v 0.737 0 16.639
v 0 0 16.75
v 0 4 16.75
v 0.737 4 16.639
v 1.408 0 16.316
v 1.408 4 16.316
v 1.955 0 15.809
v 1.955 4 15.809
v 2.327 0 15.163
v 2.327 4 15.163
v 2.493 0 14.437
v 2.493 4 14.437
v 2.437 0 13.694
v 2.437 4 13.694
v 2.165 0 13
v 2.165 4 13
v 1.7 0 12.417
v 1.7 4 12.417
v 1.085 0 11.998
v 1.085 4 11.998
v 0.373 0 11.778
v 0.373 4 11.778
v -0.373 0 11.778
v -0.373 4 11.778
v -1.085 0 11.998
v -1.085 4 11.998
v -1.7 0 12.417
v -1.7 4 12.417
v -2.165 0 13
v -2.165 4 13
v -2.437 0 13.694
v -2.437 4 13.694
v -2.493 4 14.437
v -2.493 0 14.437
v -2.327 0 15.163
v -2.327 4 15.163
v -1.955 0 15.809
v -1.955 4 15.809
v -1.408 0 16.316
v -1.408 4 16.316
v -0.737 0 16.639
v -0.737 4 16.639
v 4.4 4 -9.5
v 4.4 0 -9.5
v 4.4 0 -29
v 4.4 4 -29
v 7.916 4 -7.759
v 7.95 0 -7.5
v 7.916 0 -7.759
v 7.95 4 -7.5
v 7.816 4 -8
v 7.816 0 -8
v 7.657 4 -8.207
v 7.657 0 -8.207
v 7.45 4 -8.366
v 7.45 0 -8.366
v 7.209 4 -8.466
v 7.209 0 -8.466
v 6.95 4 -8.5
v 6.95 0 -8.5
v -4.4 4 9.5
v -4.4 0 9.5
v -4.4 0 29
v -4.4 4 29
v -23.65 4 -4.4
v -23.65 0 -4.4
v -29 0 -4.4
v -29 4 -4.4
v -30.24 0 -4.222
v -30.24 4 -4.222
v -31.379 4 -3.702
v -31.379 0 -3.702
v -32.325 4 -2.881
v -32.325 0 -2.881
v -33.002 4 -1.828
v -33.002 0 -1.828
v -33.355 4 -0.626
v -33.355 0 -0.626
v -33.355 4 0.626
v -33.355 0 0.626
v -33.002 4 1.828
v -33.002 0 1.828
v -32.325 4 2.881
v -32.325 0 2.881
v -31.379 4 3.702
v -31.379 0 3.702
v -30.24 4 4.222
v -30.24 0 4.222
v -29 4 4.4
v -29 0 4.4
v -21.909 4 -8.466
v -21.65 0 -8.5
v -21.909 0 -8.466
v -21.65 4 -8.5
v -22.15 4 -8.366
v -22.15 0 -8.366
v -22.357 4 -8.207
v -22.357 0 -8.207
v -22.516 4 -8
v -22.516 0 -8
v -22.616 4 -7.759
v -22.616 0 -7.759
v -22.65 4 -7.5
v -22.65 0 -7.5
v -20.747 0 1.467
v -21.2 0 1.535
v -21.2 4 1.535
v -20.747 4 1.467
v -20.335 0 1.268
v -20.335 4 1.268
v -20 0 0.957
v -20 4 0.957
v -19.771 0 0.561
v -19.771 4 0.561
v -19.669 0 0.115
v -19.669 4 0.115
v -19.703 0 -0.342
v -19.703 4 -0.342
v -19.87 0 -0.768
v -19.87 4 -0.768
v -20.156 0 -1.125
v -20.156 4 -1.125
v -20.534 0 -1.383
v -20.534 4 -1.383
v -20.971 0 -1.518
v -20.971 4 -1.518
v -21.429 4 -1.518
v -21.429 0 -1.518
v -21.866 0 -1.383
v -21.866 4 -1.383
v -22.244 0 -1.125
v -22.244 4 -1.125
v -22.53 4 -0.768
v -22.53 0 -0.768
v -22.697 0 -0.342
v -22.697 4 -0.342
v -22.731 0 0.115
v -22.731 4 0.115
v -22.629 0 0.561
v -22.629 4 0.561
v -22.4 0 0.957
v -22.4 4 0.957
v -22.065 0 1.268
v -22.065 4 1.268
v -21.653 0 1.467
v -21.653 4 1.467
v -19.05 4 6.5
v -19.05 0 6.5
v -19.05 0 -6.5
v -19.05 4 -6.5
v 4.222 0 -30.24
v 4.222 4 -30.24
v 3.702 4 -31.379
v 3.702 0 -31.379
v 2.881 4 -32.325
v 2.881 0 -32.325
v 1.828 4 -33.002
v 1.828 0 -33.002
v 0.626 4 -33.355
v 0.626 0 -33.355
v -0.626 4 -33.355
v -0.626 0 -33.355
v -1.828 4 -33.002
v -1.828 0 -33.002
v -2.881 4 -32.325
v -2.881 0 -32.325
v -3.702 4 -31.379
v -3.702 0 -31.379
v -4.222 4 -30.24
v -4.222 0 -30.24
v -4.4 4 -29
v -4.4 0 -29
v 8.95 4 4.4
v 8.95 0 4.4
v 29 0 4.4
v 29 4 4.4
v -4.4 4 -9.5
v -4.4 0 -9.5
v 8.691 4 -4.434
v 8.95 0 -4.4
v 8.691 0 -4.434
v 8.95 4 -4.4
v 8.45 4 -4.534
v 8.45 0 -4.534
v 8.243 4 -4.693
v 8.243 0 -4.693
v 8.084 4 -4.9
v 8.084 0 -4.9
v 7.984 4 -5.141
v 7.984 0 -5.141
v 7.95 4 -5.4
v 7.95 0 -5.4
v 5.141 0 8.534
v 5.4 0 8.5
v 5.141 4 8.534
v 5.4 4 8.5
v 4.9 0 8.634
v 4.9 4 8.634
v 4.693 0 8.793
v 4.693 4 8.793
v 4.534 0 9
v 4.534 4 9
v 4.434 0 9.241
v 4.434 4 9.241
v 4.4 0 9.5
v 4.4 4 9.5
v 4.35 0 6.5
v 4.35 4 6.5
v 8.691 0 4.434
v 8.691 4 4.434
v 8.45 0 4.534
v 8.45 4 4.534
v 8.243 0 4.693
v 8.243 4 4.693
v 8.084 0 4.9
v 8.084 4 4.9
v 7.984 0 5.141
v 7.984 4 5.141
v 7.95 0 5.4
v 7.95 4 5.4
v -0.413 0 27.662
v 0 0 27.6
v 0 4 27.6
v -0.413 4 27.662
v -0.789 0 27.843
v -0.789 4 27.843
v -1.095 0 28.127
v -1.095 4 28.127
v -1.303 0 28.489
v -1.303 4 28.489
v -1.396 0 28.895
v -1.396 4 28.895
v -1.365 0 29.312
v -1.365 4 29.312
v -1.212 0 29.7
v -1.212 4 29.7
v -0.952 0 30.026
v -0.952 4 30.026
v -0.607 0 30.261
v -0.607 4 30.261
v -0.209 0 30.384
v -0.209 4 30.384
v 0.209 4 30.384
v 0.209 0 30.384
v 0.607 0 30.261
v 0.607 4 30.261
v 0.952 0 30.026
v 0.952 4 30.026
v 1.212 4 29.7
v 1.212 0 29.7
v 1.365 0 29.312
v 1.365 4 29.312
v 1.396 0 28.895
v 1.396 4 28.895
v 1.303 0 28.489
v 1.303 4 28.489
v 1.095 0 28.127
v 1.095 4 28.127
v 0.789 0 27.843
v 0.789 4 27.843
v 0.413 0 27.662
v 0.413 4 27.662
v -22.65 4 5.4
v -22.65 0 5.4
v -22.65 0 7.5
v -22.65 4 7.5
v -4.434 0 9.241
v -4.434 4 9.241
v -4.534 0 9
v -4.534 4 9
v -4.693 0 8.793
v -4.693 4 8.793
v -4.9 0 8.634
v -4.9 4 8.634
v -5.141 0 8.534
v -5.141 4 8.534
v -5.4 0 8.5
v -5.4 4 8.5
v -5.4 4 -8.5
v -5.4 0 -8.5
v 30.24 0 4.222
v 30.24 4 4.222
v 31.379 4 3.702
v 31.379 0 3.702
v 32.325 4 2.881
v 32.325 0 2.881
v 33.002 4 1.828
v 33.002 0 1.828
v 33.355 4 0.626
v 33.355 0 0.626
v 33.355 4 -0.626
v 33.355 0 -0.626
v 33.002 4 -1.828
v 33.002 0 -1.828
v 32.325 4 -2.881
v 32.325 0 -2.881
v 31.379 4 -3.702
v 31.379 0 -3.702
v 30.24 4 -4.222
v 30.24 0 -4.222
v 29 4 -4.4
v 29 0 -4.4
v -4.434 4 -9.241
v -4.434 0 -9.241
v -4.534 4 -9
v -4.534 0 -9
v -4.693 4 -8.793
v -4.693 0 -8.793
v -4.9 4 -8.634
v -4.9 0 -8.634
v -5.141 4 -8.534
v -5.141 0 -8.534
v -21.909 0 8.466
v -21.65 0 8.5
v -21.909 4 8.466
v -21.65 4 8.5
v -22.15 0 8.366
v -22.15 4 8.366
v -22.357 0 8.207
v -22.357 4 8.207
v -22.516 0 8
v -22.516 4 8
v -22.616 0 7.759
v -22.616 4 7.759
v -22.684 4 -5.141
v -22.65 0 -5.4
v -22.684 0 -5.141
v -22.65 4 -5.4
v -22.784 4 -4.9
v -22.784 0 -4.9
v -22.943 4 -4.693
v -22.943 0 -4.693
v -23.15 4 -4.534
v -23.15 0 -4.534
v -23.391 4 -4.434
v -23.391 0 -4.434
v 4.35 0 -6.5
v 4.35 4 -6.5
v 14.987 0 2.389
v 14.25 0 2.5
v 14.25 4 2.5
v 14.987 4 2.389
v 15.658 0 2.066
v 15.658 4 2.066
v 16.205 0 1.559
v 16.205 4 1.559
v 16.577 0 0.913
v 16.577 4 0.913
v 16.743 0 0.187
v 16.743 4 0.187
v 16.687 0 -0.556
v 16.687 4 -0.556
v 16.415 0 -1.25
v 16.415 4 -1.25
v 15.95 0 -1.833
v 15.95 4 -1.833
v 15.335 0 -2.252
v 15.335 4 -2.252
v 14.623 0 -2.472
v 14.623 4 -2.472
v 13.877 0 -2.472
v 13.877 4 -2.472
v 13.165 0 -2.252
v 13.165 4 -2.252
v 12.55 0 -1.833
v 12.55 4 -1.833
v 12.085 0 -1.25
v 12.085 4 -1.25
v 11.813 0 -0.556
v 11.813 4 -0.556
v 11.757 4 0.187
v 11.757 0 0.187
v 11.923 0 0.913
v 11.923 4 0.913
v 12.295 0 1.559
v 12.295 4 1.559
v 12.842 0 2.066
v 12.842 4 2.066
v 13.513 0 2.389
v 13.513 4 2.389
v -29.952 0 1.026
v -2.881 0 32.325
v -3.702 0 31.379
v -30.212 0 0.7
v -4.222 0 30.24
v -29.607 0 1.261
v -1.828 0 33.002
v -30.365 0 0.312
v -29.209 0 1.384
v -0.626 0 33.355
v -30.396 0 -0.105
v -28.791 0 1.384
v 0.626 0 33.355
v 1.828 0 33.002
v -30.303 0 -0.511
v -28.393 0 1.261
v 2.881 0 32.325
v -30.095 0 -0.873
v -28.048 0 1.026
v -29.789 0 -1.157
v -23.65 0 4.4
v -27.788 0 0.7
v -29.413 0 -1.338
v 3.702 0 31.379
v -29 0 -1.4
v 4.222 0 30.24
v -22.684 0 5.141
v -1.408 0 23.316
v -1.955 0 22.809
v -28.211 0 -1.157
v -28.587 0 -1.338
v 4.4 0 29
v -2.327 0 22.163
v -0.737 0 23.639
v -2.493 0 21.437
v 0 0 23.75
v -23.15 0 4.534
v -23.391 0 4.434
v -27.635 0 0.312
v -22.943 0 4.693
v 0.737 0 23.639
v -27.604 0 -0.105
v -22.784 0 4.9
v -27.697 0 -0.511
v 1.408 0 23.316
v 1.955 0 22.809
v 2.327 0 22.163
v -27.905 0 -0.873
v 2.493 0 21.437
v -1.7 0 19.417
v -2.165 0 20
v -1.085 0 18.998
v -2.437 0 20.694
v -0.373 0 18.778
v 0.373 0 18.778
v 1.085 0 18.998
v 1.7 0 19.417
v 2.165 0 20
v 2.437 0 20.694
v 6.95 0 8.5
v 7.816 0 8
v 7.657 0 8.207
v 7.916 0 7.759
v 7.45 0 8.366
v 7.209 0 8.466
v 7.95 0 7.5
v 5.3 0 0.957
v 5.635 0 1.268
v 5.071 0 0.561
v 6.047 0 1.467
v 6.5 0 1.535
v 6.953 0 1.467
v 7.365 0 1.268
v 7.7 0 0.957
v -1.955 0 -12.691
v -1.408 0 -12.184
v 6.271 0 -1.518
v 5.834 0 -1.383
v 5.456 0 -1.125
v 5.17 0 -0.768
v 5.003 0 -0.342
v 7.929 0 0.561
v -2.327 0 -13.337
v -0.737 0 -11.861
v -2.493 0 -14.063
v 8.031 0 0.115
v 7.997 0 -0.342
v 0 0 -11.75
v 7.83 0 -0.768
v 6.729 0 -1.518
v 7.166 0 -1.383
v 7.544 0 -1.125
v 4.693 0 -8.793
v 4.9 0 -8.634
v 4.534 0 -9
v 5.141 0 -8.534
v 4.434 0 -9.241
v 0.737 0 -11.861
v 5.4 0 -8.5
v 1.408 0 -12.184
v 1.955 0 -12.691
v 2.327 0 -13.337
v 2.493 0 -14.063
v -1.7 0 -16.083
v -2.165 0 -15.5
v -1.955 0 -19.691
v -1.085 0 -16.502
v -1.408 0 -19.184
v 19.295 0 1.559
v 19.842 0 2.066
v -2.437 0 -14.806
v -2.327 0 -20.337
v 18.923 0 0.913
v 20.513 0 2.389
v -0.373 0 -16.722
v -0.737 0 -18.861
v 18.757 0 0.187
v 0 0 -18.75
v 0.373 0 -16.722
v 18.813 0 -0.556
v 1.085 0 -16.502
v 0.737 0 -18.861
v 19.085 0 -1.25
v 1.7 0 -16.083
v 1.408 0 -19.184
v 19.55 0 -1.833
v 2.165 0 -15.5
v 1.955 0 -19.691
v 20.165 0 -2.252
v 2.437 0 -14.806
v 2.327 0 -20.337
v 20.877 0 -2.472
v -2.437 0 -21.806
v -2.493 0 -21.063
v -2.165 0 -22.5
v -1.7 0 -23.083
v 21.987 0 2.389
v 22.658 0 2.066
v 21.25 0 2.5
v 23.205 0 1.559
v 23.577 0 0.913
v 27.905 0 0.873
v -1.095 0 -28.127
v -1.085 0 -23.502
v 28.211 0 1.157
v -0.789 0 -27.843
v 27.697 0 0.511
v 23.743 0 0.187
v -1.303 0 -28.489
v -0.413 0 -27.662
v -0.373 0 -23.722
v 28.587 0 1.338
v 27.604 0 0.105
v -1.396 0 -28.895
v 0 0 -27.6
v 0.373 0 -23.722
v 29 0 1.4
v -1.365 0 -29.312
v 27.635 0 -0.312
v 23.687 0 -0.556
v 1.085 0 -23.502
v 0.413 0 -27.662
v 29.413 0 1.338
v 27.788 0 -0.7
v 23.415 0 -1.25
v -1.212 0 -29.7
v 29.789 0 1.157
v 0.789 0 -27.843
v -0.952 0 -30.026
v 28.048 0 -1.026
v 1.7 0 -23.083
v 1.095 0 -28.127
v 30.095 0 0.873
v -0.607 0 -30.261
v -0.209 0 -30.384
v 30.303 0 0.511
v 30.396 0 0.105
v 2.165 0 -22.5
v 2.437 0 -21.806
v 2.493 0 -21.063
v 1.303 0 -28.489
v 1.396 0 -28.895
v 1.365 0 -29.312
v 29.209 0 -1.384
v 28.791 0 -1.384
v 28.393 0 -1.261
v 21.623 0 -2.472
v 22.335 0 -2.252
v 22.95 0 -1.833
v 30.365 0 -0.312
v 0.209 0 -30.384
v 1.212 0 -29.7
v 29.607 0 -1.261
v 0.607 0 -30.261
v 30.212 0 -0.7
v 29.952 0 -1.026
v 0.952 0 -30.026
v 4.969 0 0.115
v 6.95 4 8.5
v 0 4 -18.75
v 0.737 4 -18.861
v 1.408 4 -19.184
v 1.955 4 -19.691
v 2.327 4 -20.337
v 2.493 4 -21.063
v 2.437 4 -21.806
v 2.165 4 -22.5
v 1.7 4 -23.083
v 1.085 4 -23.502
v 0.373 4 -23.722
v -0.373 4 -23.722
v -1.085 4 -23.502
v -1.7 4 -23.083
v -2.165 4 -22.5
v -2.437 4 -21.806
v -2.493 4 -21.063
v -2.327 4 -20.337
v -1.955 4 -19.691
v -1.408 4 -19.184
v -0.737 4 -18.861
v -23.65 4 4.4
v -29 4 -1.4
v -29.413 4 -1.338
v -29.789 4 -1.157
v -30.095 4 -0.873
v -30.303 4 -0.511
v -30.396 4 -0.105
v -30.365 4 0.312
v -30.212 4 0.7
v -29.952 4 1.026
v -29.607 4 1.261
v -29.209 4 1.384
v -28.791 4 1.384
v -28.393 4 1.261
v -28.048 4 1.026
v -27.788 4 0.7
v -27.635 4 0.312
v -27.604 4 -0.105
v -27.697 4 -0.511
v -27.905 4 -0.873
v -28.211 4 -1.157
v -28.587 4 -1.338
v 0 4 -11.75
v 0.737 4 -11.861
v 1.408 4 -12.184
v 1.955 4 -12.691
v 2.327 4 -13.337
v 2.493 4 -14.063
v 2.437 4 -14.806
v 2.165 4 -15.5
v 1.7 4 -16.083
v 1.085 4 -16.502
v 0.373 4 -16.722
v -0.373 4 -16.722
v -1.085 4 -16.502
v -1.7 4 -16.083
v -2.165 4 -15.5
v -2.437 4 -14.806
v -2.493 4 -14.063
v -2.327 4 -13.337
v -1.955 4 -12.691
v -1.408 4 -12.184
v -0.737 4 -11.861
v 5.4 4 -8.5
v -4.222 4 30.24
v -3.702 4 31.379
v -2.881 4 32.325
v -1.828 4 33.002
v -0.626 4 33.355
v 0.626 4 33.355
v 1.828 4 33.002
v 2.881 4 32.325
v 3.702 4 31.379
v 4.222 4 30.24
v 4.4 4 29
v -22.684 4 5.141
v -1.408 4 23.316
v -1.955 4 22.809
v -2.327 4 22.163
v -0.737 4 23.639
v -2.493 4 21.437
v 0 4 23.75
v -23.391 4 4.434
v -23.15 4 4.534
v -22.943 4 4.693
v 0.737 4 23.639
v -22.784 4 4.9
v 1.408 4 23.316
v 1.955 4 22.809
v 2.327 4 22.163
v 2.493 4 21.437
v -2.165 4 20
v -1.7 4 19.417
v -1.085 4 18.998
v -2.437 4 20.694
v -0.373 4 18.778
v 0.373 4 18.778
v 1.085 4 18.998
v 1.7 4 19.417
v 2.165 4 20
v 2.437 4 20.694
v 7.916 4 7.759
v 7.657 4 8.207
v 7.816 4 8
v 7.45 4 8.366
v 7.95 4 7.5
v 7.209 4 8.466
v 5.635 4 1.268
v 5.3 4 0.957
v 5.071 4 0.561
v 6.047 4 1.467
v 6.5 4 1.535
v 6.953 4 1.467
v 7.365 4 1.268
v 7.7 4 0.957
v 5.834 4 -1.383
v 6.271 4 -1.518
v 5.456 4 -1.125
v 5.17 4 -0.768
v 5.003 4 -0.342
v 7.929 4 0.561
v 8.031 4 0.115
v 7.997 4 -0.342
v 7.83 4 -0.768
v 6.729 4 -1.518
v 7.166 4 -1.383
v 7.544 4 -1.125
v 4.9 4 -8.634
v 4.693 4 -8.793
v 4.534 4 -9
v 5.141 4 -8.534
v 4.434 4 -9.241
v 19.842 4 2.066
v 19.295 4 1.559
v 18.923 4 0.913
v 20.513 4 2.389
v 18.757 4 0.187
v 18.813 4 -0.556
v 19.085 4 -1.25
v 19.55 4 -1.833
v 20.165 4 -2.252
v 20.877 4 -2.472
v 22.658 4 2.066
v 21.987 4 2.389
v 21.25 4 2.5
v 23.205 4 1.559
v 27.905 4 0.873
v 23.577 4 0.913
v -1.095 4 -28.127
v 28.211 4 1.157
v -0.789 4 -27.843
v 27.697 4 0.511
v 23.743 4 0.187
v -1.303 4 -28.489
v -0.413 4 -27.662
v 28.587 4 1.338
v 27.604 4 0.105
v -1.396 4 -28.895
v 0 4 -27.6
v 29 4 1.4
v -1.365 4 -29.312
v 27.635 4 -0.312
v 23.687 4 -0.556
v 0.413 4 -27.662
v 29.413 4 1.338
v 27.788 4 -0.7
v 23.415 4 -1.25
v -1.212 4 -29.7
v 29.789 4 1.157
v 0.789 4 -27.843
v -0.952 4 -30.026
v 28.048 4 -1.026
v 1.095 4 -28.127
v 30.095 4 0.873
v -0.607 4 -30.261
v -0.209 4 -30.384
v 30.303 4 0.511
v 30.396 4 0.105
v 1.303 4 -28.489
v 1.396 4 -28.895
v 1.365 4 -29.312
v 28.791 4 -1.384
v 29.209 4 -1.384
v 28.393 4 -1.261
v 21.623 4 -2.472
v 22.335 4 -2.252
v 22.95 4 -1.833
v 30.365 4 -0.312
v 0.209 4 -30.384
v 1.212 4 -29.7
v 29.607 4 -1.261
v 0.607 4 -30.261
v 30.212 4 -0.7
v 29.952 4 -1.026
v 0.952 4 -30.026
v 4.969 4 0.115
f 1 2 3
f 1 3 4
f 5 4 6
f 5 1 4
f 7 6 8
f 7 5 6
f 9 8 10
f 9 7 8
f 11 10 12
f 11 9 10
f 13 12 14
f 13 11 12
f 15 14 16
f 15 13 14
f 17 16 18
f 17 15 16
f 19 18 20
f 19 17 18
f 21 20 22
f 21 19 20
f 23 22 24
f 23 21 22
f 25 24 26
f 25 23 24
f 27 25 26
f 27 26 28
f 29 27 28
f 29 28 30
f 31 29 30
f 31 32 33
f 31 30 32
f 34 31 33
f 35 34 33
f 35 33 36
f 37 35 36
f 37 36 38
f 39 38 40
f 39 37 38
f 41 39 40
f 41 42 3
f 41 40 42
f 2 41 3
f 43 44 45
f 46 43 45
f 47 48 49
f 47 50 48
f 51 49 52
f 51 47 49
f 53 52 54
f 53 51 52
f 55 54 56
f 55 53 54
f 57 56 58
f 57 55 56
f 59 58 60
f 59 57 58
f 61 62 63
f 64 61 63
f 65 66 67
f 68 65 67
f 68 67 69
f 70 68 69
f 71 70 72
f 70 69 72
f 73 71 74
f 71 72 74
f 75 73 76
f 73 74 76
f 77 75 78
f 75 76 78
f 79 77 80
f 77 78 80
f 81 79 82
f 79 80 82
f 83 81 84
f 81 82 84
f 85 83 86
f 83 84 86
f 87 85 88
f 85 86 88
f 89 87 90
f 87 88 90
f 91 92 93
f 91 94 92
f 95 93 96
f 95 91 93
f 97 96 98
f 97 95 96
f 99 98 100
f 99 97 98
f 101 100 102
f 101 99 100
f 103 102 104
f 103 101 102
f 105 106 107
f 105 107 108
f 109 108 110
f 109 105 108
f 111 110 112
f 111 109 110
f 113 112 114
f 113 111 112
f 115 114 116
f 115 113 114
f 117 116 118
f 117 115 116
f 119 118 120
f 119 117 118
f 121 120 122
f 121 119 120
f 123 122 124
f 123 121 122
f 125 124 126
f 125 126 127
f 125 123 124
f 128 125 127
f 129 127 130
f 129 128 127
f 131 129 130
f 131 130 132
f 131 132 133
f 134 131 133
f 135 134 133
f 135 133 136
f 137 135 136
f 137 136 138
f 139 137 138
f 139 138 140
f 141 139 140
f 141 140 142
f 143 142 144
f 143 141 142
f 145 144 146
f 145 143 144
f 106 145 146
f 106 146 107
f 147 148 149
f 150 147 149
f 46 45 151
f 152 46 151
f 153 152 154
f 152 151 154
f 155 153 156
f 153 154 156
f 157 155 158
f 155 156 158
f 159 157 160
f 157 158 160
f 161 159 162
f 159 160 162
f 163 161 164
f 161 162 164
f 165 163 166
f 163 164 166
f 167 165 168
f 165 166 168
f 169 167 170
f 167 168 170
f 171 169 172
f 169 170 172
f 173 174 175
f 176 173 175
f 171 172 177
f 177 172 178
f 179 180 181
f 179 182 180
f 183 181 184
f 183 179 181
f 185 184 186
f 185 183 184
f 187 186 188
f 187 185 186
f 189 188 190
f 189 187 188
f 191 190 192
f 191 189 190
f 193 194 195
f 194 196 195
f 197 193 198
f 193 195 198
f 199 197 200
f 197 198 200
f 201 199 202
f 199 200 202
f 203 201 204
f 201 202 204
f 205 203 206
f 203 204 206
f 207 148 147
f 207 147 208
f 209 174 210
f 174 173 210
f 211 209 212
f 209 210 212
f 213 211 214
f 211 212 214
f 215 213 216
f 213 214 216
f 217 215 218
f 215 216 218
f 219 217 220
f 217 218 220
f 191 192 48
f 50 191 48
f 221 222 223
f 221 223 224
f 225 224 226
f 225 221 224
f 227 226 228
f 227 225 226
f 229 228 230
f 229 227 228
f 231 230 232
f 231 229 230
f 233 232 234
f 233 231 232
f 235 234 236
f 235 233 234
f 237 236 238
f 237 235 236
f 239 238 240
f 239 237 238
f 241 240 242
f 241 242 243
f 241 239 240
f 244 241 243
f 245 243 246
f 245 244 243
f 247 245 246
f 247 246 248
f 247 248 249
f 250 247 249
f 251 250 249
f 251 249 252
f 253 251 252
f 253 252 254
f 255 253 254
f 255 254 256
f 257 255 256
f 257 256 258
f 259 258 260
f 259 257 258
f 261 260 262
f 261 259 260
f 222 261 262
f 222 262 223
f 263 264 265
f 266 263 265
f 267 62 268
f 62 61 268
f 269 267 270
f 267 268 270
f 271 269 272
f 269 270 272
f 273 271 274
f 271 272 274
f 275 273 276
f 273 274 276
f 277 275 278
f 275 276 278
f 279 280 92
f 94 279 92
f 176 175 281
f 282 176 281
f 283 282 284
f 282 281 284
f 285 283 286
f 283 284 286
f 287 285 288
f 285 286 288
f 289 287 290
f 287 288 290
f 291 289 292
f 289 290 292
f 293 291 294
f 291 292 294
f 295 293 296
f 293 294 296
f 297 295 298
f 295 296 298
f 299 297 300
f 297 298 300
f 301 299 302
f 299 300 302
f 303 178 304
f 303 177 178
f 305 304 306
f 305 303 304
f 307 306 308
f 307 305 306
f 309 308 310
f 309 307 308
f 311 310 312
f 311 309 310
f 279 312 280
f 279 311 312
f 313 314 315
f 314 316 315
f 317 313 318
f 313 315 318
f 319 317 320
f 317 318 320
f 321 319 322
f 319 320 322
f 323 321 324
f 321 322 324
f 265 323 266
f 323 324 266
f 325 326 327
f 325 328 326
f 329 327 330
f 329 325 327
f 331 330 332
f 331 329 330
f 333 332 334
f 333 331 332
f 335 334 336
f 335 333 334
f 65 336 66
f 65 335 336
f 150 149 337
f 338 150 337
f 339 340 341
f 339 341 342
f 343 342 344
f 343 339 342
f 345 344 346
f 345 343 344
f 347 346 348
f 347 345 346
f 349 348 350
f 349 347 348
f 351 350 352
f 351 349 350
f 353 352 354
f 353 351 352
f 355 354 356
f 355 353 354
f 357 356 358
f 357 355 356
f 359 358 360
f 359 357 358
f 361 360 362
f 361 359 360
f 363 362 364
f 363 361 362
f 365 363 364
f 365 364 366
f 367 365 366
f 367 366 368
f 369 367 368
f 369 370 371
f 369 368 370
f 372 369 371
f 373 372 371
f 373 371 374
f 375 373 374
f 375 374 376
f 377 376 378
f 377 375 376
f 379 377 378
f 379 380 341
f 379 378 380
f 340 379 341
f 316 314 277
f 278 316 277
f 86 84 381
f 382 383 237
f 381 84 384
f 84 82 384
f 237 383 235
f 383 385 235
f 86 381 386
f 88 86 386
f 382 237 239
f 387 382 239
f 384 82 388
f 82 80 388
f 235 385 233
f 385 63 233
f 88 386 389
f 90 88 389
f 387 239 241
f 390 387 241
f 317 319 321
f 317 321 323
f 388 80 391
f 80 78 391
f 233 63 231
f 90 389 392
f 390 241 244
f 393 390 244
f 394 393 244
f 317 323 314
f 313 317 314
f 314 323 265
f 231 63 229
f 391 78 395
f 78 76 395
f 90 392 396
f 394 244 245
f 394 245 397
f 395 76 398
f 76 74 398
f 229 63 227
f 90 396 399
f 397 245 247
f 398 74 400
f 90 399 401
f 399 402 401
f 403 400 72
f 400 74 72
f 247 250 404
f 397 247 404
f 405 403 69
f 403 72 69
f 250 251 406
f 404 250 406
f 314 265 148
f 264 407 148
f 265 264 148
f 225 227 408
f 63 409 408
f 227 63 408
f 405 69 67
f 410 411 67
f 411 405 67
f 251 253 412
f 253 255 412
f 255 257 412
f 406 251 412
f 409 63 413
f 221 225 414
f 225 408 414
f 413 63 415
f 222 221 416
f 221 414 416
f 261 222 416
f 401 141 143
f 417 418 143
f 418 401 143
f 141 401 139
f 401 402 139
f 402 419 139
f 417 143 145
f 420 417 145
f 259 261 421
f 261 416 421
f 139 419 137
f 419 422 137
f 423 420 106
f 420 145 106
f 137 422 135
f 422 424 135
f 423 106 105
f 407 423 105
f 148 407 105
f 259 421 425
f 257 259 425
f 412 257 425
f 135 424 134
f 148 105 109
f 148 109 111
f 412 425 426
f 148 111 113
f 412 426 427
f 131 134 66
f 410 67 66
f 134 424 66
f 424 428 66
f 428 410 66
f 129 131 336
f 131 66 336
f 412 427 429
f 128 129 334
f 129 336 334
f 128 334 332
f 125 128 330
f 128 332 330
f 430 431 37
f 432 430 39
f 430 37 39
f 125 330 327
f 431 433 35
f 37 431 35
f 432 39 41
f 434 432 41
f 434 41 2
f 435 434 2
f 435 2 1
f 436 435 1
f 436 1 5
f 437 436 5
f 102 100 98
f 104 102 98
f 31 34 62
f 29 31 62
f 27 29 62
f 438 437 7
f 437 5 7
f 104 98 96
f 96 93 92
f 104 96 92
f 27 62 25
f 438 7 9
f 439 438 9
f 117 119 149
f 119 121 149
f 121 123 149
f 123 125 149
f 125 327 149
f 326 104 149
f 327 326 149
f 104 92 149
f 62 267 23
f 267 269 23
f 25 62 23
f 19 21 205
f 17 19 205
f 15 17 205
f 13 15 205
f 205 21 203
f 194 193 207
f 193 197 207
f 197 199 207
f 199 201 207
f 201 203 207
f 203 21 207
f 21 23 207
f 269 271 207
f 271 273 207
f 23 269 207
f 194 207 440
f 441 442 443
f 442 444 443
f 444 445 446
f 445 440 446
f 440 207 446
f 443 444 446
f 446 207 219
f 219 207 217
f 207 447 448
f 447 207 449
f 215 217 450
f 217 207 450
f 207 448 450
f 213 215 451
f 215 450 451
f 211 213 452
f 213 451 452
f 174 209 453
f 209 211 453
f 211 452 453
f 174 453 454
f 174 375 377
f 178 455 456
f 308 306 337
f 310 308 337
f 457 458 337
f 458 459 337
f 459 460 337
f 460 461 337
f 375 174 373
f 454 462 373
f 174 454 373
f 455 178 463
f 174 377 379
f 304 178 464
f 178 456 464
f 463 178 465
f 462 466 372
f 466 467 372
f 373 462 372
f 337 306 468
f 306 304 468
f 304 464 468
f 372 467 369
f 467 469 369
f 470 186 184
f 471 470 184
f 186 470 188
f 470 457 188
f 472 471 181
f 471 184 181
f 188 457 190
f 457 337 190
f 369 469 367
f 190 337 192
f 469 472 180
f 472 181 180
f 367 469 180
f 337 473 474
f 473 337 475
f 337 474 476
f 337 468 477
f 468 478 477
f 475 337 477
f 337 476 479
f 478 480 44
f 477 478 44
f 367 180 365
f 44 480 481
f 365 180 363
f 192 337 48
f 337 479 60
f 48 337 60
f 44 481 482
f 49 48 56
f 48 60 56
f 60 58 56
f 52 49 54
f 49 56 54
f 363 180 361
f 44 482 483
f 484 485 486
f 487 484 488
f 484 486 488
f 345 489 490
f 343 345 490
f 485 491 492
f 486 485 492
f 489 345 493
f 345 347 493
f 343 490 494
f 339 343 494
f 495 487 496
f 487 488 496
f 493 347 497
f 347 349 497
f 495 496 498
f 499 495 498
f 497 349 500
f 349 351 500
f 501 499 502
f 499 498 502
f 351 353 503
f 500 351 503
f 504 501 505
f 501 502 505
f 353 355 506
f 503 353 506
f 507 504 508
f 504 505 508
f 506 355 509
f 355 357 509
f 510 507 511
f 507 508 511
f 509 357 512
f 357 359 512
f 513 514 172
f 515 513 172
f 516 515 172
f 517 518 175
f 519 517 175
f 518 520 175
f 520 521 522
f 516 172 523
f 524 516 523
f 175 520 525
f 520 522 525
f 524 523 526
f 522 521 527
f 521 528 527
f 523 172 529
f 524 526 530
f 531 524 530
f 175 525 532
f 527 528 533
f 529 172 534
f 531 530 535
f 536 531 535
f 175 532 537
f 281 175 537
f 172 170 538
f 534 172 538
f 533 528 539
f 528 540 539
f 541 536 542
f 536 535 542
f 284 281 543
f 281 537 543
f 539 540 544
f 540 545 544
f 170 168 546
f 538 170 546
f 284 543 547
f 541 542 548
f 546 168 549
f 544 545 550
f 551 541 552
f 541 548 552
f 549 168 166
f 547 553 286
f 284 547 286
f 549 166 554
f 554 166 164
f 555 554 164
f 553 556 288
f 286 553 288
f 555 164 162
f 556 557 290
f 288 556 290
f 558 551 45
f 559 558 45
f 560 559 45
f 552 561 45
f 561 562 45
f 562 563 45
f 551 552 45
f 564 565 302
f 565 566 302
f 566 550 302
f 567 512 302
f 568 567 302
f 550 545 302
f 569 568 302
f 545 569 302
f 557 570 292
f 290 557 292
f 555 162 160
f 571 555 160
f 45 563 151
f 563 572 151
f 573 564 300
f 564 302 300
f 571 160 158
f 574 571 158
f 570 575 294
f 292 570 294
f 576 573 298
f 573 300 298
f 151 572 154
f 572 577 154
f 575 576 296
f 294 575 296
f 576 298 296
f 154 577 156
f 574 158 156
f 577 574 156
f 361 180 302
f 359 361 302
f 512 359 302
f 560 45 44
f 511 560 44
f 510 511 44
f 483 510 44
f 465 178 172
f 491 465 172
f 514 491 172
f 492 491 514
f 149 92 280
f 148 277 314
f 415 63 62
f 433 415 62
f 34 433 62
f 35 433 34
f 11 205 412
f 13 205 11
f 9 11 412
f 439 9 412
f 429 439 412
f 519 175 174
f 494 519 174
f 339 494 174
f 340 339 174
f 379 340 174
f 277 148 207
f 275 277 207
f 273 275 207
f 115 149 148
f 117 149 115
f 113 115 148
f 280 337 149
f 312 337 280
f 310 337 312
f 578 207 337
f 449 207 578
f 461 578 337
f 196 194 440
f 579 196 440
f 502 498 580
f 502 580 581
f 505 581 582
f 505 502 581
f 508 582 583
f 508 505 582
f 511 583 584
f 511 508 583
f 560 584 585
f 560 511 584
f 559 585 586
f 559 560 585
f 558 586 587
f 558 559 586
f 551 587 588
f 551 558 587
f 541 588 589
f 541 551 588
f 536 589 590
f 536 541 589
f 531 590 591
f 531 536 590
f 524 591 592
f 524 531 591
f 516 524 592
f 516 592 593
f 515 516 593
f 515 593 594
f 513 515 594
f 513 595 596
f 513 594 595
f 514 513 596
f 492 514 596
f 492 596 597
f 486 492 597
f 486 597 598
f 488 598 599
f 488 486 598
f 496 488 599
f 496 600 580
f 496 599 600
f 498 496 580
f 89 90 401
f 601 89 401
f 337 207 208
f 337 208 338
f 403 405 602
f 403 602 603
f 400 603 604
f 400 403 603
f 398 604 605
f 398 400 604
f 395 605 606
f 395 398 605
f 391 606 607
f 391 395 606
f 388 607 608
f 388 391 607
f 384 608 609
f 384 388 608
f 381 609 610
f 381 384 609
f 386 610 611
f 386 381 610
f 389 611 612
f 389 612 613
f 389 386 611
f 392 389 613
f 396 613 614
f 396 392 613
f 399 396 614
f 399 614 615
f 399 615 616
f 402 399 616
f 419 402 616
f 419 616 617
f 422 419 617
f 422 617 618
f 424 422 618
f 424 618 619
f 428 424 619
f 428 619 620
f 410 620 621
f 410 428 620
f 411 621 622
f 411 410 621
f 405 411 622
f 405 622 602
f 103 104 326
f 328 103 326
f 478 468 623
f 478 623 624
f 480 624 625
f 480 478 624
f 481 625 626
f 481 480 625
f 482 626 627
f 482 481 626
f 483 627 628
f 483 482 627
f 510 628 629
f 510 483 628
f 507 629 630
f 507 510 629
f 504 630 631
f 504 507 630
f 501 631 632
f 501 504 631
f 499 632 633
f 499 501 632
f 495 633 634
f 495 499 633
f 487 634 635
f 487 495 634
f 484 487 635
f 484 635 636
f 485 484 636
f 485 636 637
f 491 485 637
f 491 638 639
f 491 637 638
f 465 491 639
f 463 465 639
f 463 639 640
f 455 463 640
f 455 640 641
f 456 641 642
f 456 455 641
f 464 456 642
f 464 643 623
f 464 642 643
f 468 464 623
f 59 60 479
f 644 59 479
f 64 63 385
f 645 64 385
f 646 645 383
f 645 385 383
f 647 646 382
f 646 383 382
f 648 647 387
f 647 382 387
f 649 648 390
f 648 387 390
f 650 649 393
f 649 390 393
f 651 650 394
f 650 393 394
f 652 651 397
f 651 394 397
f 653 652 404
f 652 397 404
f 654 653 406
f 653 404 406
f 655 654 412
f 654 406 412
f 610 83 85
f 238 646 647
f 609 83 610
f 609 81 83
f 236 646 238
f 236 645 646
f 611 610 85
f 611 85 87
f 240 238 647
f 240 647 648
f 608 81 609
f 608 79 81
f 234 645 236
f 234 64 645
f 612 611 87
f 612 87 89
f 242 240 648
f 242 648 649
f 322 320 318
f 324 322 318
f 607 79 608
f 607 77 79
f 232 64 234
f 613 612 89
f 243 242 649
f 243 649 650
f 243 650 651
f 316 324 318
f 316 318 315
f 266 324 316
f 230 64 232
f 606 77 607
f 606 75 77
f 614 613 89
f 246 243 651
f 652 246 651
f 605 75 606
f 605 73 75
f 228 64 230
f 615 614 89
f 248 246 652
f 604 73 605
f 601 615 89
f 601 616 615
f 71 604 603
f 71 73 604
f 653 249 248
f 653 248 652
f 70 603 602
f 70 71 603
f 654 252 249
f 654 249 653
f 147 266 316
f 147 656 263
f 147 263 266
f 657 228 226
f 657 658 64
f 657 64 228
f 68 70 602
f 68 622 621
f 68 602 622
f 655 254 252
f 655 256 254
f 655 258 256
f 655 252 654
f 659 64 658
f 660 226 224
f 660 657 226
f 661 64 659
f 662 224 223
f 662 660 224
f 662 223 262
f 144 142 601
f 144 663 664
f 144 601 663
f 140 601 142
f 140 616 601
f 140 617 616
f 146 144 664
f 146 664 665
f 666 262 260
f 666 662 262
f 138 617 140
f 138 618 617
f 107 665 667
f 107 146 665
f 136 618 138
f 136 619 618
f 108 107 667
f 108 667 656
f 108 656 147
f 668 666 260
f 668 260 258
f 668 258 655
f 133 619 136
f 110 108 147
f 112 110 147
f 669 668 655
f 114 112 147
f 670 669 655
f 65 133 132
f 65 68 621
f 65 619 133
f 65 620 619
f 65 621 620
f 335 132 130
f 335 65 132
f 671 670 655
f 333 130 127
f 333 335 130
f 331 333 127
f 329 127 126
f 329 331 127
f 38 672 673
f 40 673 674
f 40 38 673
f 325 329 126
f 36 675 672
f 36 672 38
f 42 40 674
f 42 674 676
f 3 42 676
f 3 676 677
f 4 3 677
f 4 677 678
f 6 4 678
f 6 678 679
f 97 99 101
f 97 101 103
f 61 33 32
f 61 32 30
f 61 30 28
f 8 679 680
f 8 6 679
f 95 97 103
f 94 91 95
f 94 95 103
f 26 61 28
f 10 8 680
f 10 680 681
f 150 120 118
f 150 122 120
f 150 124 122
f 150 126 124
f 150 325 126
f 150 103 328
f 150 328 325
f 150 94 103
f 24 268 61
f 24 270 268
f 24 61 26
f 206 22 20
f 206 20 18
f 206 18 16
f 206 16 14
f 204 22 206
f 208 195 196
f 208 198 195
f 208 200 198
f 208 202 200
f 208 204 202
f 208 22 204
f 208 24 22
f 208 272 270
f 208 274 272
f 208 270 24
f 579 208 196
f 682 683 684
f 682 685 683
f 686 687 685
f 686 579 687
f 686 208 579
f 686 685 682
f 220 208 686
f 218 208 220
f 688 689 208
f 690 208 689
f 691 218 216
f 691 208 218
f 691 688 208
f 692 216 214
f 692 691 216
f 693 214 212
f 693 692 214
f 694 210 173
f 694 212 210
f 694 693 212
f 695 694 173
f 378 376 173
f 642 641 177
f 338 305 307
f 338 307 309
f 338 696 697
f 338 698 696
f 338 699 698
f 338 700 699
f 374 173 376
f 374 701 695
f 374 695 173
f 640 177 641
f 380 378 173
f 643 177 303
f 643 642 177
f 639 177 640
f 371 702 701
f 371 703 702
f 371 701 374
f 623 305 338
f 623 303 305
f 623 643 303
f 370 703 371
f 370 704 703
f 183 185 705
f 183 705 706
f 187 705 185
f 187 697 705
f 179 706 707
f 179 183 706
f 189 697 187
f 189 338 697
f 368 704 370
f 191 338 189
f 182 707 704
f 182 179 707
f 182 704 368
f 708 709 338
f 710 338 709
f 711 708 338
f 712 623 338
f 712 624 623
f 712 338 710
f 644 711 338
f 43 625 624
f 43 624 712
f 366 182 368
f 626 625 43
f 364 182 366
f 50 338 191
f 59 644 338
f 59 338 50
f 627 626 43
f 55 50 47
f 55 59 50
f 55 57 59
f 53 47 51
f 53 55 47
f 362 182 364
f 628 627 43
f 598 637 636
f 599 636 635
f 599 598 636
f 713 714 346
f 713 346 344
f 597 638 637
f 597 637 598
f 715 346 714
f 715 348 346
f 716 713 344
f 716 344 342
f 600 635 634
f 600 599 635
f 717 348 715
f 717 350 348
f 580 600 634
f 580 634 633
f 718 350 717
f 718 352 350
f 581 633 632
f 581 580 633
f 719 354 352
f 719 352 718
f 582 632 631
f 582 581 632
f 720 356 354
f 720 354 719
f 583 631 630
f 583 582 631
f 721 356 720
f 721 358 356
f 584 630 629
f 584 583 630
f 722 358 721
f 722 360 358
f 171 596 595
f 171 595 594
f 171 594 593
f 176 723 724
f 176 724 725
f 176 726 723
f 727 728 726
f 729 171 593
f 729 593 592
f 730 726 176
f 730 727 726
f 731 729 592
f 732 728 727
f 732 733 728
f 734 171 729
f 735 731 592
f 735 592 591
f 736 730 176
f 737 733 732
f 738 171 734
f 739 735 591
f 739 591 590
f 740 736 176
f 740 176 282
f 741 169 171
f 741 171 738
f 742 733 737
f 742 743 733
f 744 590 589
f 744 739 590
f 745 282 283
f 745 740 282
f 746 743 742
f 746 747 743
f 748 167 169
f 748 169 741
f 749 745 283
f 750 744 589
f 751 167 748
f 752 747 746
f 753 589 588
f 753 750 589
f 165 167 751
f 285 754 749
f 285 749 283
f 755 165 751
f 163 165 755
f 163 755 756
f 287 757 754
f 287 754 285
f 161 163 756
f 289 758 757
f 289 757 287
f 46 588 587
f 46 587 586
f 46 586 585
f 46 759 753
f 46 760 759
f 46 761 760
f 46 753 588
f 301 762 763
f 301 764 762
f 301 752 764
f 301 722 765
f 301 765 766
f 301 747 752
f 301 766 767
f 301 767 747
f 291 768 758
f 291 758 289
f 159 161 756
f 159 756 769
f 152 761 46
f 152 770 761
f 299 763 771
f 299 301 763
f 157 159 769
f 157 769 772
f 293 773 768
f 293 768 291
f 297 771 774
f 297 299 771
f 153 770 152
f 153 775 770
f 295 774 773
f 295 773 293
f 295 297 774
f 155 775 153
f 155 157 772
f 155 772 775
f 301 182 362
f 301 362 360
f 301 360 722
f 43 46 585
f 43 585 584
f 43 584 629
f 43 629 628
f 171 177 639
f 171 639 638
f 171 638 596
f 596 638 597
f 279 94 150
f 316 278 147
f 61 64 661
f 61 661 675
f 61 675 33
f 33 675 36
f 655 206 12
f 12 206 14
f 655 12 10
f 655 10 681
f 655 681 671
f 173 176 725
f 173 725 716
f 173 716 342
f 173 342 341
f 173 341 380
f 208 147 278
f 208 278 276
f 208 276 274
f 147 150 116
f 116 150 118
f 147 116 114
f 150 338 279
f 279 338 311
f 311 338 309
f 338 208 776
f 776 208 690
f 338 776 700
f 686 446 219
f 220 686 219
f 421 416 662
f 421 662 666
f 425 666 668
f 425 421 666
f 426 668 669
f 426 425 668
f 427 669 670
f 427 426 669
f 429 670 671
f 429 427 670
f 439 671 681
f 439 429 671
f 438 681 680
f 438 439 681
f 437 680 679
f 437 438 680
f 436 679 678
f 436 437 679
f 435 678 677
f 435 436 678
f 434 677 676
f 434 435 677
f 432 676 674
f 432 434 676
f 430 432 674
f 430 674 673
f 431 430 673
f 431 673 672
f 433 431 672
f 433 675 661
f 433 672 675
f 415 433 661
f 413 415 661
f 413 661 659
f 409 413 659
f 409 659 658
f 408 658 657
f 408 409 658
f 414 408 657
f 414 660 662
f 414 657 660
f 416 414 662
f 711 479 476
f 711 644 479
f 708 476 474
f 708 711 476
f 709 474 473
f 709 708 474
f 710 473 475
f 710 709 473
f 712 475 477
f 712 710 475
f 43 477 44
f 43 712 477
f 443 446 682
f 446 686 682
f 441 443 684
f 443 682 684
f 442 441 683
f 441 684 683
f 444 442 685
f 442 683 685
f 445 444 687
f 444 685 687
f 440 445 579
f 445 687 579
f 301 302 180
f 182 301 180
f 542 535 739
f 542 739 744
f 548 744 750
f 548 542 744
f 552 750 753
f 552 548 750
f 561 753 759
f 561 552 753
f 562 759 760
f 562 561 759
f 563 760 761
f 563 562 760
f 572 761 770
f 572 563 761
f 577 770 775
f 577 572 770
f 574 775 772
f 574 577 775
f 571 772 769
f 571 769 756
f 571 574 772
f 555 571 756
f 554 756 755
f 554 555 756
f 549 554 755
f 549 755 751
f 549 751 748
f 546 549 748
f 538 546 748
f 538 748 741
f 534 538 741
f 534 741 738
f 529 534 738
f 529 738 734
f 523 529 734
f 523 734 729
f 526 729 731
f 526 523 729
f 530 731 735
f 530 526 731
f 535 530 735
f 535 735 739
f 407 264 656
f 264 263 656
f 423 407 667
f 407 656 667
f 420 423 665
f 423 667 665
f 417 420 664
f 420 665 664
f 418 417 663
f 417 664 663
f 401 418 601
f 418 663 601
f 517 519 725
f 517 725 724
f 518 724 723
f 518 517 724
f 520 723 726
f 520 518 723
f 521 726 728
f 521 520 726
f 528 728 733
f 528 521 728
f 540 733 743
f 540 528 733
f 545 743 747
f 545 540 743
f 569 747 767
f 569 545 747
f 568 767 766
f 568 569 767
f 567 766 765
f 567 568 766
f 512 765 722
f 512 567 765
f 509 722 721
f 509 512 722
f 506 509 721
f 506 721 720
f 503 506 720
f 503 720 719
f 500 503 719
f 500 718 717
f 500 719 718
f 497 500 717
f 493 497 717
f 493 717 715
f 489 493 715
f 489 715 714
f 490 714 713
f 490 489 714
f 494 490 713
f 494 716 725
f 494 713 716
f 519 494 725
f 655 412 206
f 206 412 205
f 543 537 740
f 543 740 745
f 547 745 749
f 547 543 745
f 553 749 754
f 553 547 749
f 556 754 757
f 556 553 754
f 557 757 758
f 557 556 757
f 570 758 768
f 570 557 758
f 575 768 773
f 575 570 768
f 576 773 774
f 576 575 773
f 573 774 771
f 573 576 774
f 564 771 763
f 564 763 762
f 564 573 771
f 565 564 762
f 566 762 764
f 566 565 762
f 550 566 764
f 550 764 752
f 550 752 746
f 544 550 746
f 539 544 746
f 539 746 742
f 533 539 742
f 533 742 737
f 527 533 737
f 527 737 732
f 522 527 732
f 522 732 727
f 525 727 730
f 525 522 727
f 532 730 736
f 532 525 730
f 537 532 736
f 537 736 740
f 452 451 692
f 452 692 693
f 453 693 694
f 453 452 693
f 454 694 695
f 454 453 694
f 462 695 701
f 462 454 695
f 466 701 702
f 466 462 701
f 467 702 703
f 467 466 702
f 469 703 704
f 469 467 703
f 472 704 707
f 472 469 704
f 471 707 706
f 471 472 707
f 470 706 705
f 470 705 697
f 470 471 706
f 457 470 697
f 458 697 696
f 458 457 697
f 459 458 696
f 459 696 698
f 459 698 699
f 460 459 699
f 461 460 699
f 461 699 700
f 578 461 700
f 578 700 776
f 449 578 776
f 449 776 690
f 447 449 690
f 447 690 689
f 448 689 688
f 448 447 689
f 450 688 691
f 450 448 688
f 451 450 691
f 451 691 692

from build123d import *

# Parameters (mm, degrees)
SKETCH2_R               = 1.4
SKETCH2_R_2             = 1.535241885
SKETCH2_W               = 23.4
SKETCH2_H               = 13
BOSS_EXTRUDE2_DEPTH     = 4
CUT_EXTRUDE3_DEPTH      = 48.403797316
CUT_EXTRUDE3_DEPTH_BACK = 48.403797316
SKETCH3_R               = 2.5
FILLET1_R               = 1


with BuildPart() as part:
    # Sketch2 → Boss-Extrude2 (new body)
    with BuildSketch(Plane(origin=(0, 0, 0), x_dir=(1, 0, 0), z_dir=(0, 1, 0))):
        with BuildLine():
            Line((29, 4.4), (7.95, 4.4))
            Line((7.95, 4.4), (7.95, 8.5))
            Line((7.95, 8.5), (4.4, 8.5))
            Line((4.4, 8.5), (4.4, 29))
            ThreePointArc((4.4, 29), (0, 33.4), (-4.4, 29))
            Line((-4.4, 29), (-4.4, 8.5))
            Line((-4.4, 8.5), (-22.65, 8.5))
            Line((-22.65, 8.5), (-22.65, 4.4))
            Line((-22.65, 4.4), (-29, 4.4))
            ThreePointArc((-29, 4.4), (-33.4, 0), (-29, -4.4))
            Line((-29, -4.4), (-22.65, -4.4))
            Line((-22.65, -4.4), (-22.65, -8.5))
            Line((-22.65, -8.5), (-4.4, -8.5))
            Line((-4.4, -8.5), (-4.4, -29))
            ThreePointArc((-4.4, -29), (0, -33.4), (4.4, -29))
            Line((4.4, -29), (4.4, -8.5))
            Line((4.4, -8.5), (7.95, -8.5))
            Line((7.95, -8.5), (7.95, -4.4))
            Line((7.95, -4.4), (29, -4.4))
            ThreePointArc((29, -4.4), (33.4, 0), (29, 4.4))
        make_face()
        with Locations(Location((0, 29, 0), (0, 0, 270))):
            Circle(SKETCH2_R, mode=Mode.SUBTRACT)
        with Locations(Location((29, 0, 0), (0, 0, 270))):
            Circle(SKETCH2_R, mode=Mode.SUBTRACT)
        with Locations(Location((0, -29, 0), (0, 0, 90))):
            Circle(SKETCH2_R, mode=Mode.SUBTRACT)
        with Locations(Location((-29, 0, 0), (0, 0, 90))):
            Circle(SKETCH2_R, mode=Mode.SUBTRACT)
        with Locations(Location((6.5, 0, 0), (0, 0, 270))):
            Circle(SKETCH2_R_2, mode=Mode.SUBTRACT)
        with Locations(Location((-21.2, 0, 0), (0, 0, 270))):
            Circle(SKETCH2_R_2, mode=Mode.SUBTRACT)
        with Locations((-7.35, 0)):
            Rectangle(SKETCH2_W, SKETCH2_H, mode=Mode.SUBTRACT)
    extrude(amount=BOSS_EXTRUDE2_DEPTH)

    # Sketch3 → Cut-Extrude3 (cut, two sides: drawn at the far end of the back side and taken through both)
    with BuildSketch(Plane(origin=(0, 0, 0), x_dir=(1, 0, 0), z_dir=(0, 1, 0)).offset(-CUT_EXTRUDE3_DEPTH_BACK)):
        with Locations(Location((0, 21.25, 0), (0, 0, 270))):
            Circle(SKETCH3_R)
        with Locations(Location((0, 14.25, 0), (0, 0, 270))):
            Circle(SKETCH3_R)
        with Locations(Location((14.25, 0, 0), (0, 0, 270))):
            Circle(SKETCH3_R)
        with Locations(Location((21.25, 0, 0), (0, 0, 270))):
            Circle(SKETCH3_R)
        with Locations(Location((0, -14.25, 0), (0, 0, 270))):
            Circle(SKETCH3_R)
        with Locations(Location((0, -21.25, 0), (0, 0, 270))):
            Circle(SKETCH3_R)
    extrude(amount=CUT_EXTRUDE3_DEPTH + CUT_EXTRUDE3_DEPTH_BACK, mode=Mode.SUBTRACT)

    # Fillet1
    fillet1_edges = [part.edges().sort_by_distance(p)[0] for p in [
        (7.95, 2, 4.4),
        (7.95, 2, 8.5),
        (4.4, 2, 8.5),
        (-4.4, 2, 8.5),
        (-22.65, 2, 8.5),
        (-22.65, 2, 4.4),
        (-22.65, 2, -4.4),
        (-22.65, 2, -8.5),
        (-4.4, 2, -8.5),
        (4.4, 2, -8.5),
        (7.95, 2, -8.5),
        (7.95, 2, -4.4),
    ]]
    fillet(fillet1_edges, radius=FILLET1_R)


solid = part.part
